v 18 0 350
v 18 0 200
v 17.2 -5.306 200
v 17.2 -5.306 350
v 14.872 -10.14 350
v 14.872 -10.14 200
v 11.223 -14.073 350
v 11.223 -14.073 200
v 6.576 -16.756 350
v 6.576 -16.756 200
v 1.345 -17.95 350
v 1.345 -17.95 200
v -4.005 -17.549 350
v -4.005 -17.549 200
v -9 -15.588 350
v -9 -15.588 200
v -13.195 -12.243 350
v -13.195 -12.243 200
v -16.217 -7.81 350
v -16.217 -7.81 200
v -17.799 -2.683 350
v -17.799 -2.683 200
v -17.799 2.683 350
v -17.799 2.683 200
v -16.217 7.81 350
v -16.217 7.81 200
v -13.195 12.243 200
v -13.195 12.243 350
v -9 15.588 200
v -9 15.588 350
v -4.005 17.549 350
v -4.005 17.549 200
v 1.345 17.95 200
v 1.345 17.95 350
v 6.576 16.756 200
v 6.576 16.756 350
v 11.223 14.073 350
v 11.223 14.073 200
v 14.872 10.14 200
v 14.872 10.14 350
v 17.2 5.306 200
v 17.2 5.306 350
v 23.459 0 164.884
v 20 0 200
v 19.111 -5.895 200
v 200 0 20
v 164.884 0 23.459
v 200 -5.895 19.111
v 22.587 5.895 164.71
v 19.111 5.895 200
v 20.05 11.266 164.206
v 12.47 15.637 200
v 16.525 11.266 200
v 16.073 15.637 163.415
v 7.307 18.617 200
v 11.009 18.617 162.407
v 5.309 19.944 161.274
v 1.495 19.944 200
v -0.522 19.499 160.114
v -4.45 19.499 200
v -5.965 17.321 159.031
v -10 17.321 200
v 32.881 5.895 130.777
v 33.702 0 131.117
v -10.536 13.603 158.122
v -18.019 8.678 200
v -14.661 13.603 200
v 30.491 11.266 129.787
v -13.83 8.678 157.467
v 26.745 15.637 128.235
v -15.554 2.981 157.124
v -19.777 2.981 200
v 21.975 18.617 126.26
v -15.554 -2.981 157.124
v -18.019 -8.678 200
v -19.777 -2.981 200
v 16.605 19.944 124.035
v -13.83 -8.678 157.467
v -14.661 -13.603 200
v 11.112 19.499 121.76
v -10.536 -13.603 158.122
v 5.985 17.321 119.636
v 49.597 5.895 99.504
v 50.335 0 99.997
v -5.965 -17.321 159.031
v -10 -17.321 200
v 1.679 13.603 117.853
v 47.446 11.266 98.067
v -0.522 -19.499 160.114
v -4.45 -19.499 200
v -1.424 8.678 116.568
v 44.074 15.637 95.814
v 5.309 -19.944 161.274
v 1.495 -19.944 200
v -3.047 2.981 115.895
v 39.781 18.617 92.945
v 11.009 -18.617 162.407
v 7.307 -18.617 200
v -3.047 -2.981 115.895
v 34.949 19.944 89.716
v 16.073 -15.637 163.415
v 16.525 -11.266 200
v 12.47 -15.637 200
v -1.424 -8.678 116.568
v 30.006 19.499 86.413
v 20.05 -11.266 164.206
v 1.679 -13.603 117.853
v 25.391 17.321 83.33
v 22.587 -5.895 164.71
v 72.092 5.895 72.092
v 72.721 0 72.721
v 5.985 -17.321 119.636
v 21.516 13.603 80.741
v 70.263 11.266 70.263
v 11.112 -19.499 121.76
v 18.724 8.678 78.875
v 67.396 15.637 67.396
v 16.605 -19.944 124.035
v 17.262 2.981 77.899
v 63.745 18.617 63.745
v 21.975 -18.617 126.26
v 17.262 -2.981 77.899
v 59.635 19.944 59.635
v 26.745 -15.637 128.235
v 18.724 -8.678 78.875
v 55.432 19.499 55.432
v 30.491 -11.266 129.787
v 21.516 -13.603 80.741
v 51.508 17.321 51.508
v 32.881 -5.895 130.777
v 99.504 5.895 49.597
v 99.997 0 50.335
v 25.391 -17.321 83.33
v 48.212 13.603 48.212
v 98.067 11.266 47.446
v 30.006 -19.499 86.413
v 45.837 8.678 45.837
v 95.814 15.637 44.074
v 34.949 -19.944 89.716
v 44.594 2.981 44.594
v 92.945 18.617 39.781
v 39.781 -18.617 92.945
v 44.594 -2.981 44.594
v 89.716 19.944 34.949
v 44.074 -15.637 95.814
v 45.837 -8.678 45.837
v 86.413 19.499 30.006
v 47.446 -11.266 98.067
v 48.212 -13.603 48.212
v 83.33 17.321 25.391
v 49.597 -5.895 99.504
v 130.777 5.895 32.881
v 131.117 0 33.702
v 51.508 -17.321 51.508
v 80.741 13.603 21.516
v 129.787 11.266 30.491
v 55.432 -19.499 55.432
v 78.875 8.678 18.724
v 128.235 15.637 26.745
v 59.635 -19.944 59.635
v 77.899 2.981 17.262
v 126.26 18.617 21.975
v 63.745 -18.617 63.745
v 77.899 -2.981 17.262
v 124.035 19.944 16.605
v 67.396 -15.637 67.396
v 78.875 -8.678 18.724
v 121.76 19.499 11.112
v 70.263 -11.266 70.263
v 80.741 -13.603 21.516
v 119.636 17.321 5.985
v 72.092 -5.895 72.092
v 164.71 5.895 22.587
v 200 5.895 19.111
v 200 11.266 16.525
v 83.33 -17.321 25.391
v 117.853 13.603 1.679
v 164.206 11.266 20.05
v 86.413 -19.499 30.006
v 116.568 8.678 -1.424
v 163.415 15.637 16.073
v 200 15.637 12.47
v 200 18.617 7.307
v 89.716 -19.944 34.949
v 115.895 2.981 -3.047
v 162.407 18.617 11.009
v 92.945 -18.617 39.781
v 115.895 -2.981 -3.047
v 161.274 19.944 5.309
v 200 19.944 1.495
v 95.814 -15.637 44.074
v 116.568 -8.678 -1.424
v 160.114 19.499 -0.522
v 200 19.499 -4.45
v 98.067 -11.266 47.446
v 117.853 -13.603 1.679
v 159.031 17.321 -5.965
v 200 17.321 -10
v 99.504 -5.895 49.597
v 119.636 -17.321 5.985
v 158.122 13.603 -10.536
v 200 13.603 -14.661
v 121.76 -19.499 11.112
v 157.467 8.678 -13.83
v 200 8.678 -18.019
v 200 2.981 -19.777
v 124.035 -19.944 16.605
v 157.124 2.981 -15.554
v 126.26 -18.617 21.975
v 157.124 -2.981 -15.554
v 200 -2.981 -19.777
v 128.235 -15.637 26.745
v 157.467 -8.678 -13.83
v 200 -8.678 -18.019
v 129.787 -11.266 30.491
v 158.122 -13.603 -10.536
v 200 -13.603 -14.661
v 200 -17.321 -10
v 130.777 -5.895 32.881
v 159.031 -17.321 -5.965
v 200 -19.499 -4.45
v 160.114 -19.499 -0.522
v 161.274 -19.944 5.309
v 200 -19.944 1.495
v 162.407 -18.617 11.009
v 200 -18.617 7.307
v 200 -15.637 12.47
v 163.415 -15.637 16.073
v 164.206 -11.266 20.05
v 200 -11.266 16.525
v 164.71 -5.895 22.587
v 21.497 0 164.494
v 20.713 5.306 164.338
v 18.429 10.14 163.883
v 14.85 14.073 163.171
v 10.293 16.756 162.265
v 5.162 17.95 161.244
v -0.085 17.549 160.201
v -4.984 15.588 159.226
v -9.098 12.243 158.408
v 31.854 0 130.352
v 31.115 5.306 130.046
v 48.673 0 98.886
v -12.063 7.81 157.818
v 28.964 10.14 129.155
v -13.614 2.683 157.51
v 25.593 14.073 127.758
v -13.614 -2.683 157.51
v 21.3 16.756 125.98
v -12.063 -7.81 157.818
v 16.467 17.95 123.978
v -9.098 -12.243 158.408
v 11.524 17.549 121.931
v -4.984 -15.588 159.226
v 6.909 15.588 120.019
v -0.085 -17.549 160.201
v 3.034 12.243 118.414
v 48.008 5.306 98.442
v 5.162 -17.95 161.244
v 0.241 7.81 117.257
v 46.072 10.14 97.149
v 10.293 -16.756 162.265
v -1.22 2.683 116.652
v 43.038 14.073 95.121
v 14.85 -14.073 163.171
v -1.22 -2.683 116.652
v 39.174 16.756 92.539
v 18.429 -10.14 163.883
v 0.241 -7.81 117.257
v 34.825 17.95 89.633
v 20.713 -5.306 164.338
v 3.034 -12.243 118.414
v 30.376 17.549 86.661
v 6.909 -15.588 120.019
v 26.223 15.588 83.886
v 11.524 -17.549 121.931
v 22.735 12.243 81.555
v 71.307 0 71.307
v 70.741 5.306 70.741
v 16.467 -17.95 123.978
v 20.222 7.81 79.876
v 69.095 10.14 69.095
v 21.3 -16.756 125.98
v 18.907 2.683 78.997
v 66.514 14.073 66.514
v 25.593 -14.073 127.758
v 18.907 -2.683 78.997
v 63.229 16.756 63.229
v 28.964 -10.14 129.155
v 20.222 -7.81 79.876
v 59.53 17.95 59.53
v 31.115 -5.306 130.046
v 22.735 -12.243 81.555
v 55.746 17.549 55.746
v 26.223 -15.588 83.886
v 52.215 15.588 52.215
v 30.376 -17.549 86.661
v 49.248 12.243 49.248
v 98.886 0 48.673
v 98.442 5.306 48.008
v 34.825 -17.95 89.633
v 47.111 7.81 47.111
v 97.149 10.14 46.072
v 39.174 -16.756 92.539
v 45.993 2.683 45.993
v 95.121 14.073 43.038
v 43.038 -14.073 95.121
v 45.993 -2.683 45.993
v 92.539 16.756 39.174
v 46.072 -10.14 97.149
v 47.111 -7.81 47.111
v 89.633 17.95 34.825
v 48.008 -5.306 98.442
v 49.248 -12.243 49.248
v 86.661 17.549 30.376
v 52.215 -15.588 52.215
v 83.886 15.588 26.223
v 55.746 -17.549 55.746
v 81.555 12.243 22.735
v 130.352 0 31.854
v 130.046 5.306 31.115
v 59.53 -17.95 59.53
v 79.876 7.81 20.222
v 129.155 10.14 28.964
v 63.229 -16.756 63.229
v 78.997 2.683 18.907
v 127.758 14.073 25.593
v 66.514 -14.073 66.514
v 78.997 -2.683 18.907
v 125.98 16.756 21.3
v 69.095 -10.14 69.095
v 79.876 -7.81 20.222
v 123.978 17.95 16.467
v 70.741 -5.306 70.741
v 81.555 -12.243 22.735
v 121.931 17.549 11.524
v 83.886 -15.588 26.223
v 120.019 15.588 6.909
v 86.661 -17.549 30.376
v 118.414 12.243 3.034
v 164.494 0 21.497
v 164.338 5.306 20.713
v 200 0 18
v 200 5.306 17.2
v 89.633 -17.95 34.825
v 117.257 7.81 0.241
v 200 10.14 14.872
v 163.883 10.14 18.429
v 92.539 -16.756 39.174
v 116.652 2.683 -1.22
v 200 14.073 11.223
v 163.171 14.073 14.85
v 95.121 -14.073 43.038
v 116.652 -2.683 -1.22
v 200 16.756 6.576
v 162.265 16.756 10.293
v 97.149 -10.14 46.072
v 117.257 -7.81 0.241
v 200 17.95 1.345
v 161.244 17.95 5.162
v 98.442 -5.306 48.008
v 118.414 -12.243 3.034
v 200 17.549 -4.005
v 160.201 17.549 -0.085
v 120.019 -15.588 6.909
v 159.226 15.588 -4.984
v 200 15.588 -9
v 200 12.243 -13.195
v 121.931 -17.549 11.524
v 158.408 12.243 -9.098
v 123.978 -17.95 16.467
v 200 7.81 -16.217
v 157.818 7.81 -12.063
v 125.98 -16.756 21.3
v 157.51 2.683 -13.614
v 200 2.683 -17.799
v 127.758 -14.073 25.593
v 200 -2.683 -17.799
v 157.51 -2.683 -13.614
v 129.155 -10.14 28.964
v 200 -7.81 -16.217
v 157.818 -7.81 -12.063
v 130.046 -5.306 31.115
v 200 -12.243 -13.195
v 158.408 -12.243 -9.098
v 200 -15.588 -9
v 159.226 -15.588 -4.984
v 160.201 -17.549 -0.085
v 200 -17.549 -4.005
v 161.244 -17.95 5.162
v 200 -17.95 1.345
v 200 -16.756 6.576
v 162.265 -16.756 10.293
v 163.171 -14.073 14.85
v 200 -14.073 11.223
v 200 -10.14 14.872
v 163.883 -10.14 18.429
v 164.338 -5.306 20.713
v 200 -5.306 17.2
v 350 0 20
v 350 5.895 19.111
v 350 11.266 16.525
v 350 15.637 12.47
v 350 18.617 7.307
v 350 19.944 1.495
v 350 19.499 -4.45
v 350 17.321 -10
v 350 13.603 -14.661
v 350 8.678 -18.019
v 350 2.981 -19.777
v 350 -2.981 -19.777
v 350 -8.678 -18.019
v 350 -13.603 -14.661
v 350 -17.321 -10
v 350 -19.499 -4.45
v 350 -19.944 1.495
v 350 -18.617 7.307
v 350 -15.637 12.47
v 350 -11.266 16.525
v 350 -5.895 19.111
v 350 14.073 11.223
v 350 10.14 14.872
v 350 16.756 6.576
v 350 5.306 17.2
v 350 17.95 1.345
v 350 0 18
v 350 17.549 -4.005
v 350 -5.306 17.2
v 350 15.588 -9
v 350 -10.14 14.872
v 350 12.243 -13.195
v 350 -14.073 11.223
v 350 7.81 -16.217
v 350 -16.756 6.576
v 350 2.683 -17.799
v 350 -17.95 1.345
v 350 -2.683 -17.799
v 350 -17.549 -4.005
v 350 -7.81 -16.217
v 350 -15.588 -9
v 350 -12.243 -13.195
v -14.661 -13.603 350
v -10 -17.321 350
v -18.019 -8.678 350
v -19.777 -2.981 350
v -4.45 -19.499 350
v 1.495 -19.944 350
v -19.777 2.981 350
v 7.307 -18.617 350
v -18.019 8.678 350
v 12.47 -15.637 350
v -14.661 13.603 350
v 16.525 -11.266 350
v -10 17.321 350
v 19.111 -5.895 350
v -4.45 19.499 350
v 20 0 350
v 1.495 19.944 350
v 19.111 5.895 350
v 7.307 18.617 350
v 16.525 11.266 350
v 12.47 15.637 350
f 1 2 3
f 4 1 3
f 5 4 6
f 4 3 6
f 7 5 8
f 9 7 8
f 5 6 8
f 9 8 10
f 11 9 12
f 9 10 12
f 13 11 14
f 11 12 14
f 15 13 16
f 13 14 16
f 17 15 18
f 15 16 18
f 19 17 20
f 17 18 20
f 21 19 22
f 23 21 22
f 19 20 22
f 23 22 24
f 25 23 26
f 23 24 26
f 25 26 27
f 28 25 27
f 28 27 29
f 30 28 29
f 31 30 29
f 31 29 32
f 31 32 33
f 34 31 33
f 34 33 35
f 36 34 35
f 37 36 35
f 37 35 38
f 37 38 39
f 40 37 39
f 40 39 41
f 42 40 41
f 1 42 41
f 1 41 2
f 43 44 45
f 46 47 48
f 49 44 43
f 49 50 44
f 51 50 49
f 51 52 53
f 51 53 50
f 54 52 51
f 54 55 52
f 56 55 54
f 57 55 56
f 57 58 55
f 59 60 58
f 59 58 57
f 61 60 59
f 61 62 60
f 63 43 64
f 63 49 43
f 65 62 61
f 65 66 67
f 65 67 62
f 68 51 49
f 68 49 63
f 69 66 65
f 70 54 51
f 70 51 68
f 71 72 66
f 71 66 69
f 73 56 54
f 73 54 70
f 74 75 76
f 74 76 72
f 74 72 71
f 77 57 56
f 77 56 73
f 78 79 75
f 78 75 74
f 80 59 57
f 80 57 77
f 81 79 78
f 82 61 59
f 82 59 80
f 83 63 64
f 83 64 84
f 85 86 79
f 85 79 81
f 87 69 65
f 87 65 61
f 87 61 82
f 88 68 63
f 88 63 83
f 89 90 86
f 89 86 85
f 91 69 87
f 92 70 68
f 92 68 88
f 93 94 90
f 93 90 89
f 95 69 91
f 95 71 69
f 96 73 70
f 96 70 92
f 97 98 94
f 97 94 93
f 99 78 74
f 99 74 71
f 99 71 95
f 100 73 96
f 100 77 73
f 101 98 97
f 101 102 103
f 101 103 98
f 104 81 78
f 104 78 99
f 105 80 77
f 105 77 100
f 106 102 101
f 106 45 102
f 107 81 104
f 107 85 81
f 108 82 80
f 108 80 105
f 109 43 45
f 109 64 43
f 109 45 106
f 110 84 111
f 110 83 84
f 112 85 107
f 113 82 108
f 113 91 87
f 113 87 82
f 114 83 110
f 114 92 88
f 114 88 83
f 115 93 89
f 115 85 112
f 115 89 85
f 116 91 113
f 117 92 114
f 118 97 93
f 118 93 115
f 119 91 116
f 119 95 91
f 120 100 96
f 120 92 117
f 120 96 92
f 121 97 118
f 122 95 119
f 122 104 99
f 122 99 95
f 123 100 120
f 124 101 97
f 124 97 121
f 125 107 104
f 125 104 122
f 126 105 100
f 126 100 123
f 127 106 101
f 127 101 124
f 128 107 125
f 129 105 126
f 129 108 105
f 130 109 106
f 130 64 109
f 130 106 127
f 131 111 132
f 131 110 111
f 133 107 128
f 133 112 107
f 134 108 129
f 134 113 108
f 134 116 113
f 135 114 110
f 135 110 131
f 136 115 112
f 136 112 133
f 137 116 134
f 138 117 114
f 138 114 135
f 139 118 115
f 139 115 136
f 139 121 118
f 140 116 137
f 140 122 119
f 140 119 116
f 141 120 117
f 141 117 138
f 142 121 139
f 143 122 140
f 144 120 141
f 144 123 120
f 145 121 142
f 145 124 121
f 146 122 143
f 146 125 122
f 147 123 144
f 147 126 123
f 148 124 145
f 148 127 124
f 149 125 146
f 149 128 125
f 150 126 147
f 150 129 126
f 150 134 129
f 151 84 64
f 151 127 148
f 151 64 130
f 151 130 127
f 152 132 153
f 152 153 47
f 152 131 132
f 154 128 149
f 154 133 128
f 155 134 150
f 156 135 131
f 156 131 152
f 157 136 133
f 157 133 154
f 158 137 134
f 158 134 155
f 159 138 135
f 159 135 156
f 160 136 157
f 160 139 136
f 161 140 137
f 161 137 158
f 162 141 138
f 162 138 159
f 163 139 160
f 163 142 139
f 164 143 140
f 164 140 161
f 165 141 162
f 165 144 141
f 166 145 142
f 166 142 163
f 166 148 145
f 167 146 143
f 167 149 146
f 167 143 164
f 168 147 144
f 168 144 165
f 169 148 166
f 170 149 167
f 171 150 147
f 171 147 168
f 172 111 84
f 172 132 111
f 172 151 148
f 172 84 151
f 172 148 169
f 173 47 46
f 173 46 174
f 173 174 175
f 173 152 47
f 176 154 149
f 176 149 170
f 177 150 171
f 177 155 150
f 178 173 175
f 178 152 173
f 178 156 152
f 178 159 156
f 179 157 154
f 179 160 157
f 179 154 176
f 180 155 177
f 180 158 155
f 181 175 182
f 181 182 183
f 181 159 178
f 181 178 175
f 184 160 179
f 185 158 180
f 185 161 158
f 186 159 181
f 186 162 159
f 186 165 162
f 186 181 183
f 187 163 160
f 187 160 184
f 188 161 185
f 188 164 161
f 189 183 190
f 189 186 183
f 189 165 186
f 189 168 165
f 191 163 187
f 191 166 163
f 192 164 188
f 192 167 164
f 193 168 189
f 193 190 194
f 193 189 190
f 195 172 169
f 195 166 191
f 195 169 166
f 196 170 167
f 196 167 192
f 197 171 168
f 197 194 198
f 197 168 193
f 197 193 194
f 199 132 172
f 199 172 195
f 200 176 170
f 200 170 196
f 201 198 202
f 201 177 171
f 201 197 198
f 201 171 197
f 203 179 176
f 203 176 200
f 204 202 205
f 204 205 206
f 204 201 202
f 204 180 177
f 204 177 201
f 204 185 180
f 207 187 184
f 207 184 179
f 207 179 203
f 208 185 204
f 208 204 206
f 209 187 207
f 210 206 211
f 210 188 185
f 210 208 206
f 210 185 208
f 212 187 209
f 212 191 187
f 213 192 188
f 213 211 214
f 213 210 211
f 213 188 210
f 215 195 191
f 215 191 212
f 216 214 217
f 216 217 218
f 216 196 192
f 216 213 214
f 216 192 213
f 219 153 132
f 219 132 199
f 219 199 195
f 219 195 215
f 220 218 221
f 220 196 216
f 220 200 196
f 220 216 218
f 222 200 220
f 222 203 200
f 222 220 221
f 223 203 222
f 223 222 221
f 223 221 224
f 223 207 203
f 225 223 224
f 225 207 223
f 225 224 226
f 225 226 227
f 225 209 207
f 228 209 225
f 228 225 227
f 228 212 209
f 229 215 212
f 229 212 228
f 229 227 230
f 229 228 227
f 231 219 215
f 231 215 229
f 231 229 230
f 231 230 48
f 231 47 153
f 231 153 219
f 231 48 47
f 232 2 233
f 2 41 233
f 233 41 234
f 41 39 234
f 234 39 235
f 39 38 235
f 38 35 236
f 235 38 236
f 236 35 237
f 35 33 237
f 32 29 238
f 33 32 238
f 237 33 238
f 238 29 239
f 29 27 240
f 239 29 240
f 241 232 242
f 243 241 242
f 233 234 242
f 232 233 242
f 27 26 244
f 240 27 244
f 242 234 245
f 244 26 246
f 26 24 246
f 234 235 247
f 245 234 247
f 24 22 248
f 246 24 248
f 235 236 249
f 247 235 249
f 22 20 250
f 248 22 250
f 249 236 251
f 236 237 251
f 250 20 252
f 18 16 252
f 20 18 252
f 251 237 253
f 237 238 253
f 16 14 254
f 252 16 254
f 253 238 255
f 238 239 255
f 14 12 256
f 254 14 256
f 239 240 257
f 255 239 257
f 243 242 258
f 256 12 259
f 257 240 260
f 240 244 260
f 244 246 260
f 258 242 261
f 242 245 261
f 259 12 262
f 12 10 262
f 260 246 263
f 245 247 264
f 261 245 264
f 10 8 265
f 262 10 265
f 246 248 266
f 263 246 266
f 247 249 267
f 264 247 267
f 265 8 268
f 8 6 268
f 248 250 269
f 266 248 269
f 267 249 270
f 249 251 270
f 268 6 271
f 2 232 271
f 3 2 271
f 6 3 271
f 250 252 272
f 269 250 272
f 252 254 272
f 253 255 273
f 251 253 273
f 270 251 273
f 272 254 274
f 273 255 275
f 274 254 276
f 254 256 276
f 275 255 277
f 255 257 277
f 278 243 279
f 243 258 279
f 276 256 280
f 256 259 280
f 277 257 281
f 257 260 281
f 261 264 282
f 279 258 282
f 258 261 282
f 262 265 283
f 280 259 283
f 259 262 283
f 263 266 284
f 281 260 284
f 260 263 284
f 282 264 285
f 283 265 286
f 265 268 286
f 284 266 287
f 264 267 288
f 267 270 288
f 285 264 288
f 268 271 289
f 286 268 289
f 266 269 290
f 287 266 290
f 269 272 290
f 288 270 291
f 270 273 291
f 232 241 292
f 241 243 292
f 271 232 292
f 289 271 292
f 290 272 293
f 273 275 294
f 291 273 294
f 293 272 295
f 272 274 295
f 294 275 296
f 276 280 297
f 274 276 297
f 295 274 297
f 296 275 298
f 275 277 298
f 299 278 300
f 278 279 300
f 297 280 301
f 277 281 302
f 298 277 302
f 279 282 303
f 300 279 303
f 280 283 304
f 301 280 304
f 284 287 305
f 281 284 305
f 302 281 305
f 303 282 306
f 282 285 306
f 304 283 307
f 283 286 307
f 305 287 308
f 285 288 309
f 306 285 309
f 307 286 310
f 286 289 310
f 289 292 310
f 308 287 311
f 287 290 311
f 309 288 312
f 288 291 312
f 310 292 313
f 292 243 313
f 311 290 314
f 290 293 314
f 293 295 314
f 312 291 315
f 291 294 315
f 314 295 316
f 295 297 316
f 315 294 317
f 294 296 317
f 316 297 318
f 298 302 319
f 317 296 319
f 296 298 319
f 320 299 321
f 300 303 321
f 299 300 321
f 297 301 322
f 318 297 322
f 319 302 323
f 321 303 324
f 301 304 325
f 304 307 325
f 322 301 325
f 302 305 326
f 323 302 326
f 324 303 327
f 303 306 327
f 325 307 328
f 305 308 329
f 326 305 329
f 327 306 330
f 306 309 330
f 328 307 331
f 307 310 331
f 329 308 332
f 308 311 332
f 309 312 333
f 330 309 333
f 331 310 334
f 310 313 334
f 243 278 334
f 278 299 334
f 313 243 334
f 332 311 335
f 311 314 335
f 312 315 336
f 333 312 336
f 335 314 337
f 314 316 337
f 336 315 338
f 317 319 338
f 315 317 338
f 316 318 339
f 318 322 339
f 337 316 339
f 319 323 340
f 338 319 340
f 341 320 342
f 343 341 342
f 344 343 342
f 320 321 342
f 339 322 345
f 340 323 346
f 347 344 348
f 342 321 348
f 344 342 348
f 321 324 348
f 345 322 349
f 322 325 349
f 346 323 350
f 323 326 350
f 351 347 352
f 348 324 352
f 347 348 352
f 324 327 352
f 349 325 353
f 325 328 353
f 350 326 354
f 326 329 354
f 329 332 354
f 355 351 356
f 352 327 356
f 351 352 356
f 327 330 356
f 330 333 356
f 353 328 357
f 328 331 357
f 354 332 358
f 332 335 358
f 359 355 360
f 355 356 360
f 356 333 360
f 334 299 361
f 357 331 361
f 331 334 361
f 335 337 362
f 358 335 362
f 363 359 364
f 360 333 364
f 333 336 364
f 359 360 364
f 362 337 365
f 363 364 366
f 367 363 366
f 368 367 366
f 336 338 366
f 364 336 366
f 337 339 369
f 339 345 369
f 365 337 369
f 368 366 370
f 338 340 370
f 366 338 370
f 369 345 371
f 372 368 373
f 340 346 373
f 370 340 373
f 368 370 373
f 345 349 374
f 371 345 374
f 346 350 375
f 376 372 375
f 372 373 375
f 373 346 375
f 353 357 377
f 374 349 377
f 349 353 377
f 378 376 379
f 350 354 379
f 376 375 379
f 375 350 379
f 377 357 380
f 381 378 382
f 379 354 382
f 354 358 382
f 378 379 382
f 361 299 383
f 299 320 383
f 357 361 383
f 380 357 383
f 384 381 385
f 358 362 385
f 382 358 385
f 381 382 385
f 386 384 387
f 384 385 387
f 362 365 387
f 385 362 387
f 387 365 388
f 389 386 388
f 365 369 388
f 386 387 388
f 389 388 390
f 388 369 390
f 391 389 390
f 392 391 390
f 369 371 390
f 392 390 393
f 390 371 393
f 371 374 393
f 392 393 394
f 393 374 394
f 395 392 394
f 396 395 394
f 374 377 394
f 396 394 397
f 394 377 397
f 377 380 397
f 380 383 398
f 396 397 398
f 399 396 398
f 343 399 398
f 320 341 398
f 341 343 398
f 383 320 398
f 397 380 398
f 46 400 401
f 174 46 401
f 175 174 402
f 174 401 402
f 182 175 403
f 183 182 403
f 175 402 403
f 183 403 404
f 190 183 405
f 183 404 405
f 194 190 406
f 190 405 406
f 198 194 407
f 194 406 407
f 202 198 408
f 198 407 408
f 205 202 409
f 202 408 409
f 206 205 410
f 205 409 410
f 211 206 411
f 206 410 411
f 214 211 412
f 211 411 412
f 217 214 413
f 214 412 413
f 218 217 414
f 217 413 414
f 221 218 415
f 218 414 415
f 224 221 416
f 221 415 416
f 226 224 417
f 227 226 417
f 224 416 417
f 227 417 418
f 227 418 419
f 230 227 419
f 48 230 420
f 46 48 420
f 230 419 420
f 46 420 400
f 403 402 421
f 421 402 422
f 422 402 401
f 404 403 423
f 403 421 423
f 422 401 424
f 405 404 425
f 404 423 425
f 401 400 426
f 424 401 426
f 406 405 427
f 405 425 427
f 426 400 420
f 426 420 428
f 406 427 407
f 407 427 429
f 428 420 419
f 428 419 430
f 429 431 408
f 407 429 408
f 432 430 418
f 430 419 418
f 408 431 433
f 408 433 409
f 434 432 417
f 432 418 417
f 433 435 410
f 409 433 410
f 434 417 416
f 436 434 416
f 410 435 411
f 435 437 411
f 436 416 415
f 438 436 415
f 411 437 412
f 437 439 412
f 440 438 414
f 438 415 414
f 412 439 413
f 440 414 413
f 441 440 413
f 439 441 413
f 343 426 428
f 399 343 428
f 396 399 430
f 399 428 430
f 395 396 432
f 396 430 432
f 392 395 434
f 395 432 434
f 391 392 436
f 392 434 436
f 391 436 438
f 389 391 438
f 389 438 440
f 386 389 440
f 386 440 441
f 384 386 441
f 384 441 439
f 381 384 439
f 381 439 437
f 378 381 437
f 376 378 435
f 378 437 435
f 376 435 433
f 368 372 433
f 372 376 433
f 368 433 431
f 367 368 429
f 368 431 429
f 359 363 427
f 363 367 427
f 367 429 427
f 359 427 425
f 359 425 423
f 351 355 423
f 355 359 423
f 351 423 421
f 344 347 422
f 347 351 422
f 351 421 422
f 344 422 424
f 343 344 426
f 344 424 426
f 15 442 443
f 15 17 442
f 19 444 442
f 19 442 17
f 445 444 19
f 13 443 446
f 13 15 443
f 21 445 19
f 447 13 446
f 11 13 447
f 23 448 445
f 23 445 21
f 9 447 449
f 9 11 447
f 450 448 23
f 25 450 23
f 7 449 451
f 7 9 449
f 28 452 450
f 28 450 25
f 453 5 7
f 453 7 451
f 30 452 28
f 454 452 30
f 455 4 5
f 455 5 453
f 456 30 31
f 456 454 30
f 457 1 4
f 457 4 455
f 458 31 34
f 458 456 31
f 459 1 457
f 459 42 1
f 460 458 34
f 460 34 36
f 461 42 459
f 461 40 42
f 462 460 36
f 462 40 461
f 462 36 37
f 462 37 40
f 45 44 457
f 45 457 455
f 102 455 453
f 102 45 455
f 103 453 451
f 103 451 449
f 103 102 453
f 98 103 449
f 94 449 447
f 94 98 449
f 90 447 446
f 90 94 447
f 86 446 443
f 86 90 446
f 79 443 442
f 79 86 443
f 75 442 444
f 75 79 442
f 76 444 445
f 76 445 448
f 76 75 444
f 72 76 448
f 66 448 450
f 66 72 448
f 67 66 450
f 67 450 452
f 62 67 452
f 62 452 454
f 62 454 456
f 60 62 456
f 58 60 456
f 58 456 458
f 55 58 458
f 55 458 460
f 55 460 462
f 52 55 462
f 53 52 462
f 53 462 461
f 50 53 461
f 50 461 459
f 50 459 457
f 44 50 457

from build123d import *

# Parameters (mm, degrees)
F2_R   = 20
F2_R_2 = 18


with BuildPart() as f3:
    # F3: sweep along a path in F0
    with BuildLine(Plane.XZ) as f3_path:
        Line((0, 350), (0, 200))
        ThreePointArc((0, 200), (58.578644, 58.578644), (200, 0))
        Line((200, 0), (350, 0))
    # F2 (on plane+point) → F3 (sweep)
    with BuildSketch(Plane.XY.offset(350)):
        Circle(F2_R)
        Circle(F2_R_2, mode=Mode.SUBTRACT)
    sweep(path=f3_path.line)


solid = f3.part
